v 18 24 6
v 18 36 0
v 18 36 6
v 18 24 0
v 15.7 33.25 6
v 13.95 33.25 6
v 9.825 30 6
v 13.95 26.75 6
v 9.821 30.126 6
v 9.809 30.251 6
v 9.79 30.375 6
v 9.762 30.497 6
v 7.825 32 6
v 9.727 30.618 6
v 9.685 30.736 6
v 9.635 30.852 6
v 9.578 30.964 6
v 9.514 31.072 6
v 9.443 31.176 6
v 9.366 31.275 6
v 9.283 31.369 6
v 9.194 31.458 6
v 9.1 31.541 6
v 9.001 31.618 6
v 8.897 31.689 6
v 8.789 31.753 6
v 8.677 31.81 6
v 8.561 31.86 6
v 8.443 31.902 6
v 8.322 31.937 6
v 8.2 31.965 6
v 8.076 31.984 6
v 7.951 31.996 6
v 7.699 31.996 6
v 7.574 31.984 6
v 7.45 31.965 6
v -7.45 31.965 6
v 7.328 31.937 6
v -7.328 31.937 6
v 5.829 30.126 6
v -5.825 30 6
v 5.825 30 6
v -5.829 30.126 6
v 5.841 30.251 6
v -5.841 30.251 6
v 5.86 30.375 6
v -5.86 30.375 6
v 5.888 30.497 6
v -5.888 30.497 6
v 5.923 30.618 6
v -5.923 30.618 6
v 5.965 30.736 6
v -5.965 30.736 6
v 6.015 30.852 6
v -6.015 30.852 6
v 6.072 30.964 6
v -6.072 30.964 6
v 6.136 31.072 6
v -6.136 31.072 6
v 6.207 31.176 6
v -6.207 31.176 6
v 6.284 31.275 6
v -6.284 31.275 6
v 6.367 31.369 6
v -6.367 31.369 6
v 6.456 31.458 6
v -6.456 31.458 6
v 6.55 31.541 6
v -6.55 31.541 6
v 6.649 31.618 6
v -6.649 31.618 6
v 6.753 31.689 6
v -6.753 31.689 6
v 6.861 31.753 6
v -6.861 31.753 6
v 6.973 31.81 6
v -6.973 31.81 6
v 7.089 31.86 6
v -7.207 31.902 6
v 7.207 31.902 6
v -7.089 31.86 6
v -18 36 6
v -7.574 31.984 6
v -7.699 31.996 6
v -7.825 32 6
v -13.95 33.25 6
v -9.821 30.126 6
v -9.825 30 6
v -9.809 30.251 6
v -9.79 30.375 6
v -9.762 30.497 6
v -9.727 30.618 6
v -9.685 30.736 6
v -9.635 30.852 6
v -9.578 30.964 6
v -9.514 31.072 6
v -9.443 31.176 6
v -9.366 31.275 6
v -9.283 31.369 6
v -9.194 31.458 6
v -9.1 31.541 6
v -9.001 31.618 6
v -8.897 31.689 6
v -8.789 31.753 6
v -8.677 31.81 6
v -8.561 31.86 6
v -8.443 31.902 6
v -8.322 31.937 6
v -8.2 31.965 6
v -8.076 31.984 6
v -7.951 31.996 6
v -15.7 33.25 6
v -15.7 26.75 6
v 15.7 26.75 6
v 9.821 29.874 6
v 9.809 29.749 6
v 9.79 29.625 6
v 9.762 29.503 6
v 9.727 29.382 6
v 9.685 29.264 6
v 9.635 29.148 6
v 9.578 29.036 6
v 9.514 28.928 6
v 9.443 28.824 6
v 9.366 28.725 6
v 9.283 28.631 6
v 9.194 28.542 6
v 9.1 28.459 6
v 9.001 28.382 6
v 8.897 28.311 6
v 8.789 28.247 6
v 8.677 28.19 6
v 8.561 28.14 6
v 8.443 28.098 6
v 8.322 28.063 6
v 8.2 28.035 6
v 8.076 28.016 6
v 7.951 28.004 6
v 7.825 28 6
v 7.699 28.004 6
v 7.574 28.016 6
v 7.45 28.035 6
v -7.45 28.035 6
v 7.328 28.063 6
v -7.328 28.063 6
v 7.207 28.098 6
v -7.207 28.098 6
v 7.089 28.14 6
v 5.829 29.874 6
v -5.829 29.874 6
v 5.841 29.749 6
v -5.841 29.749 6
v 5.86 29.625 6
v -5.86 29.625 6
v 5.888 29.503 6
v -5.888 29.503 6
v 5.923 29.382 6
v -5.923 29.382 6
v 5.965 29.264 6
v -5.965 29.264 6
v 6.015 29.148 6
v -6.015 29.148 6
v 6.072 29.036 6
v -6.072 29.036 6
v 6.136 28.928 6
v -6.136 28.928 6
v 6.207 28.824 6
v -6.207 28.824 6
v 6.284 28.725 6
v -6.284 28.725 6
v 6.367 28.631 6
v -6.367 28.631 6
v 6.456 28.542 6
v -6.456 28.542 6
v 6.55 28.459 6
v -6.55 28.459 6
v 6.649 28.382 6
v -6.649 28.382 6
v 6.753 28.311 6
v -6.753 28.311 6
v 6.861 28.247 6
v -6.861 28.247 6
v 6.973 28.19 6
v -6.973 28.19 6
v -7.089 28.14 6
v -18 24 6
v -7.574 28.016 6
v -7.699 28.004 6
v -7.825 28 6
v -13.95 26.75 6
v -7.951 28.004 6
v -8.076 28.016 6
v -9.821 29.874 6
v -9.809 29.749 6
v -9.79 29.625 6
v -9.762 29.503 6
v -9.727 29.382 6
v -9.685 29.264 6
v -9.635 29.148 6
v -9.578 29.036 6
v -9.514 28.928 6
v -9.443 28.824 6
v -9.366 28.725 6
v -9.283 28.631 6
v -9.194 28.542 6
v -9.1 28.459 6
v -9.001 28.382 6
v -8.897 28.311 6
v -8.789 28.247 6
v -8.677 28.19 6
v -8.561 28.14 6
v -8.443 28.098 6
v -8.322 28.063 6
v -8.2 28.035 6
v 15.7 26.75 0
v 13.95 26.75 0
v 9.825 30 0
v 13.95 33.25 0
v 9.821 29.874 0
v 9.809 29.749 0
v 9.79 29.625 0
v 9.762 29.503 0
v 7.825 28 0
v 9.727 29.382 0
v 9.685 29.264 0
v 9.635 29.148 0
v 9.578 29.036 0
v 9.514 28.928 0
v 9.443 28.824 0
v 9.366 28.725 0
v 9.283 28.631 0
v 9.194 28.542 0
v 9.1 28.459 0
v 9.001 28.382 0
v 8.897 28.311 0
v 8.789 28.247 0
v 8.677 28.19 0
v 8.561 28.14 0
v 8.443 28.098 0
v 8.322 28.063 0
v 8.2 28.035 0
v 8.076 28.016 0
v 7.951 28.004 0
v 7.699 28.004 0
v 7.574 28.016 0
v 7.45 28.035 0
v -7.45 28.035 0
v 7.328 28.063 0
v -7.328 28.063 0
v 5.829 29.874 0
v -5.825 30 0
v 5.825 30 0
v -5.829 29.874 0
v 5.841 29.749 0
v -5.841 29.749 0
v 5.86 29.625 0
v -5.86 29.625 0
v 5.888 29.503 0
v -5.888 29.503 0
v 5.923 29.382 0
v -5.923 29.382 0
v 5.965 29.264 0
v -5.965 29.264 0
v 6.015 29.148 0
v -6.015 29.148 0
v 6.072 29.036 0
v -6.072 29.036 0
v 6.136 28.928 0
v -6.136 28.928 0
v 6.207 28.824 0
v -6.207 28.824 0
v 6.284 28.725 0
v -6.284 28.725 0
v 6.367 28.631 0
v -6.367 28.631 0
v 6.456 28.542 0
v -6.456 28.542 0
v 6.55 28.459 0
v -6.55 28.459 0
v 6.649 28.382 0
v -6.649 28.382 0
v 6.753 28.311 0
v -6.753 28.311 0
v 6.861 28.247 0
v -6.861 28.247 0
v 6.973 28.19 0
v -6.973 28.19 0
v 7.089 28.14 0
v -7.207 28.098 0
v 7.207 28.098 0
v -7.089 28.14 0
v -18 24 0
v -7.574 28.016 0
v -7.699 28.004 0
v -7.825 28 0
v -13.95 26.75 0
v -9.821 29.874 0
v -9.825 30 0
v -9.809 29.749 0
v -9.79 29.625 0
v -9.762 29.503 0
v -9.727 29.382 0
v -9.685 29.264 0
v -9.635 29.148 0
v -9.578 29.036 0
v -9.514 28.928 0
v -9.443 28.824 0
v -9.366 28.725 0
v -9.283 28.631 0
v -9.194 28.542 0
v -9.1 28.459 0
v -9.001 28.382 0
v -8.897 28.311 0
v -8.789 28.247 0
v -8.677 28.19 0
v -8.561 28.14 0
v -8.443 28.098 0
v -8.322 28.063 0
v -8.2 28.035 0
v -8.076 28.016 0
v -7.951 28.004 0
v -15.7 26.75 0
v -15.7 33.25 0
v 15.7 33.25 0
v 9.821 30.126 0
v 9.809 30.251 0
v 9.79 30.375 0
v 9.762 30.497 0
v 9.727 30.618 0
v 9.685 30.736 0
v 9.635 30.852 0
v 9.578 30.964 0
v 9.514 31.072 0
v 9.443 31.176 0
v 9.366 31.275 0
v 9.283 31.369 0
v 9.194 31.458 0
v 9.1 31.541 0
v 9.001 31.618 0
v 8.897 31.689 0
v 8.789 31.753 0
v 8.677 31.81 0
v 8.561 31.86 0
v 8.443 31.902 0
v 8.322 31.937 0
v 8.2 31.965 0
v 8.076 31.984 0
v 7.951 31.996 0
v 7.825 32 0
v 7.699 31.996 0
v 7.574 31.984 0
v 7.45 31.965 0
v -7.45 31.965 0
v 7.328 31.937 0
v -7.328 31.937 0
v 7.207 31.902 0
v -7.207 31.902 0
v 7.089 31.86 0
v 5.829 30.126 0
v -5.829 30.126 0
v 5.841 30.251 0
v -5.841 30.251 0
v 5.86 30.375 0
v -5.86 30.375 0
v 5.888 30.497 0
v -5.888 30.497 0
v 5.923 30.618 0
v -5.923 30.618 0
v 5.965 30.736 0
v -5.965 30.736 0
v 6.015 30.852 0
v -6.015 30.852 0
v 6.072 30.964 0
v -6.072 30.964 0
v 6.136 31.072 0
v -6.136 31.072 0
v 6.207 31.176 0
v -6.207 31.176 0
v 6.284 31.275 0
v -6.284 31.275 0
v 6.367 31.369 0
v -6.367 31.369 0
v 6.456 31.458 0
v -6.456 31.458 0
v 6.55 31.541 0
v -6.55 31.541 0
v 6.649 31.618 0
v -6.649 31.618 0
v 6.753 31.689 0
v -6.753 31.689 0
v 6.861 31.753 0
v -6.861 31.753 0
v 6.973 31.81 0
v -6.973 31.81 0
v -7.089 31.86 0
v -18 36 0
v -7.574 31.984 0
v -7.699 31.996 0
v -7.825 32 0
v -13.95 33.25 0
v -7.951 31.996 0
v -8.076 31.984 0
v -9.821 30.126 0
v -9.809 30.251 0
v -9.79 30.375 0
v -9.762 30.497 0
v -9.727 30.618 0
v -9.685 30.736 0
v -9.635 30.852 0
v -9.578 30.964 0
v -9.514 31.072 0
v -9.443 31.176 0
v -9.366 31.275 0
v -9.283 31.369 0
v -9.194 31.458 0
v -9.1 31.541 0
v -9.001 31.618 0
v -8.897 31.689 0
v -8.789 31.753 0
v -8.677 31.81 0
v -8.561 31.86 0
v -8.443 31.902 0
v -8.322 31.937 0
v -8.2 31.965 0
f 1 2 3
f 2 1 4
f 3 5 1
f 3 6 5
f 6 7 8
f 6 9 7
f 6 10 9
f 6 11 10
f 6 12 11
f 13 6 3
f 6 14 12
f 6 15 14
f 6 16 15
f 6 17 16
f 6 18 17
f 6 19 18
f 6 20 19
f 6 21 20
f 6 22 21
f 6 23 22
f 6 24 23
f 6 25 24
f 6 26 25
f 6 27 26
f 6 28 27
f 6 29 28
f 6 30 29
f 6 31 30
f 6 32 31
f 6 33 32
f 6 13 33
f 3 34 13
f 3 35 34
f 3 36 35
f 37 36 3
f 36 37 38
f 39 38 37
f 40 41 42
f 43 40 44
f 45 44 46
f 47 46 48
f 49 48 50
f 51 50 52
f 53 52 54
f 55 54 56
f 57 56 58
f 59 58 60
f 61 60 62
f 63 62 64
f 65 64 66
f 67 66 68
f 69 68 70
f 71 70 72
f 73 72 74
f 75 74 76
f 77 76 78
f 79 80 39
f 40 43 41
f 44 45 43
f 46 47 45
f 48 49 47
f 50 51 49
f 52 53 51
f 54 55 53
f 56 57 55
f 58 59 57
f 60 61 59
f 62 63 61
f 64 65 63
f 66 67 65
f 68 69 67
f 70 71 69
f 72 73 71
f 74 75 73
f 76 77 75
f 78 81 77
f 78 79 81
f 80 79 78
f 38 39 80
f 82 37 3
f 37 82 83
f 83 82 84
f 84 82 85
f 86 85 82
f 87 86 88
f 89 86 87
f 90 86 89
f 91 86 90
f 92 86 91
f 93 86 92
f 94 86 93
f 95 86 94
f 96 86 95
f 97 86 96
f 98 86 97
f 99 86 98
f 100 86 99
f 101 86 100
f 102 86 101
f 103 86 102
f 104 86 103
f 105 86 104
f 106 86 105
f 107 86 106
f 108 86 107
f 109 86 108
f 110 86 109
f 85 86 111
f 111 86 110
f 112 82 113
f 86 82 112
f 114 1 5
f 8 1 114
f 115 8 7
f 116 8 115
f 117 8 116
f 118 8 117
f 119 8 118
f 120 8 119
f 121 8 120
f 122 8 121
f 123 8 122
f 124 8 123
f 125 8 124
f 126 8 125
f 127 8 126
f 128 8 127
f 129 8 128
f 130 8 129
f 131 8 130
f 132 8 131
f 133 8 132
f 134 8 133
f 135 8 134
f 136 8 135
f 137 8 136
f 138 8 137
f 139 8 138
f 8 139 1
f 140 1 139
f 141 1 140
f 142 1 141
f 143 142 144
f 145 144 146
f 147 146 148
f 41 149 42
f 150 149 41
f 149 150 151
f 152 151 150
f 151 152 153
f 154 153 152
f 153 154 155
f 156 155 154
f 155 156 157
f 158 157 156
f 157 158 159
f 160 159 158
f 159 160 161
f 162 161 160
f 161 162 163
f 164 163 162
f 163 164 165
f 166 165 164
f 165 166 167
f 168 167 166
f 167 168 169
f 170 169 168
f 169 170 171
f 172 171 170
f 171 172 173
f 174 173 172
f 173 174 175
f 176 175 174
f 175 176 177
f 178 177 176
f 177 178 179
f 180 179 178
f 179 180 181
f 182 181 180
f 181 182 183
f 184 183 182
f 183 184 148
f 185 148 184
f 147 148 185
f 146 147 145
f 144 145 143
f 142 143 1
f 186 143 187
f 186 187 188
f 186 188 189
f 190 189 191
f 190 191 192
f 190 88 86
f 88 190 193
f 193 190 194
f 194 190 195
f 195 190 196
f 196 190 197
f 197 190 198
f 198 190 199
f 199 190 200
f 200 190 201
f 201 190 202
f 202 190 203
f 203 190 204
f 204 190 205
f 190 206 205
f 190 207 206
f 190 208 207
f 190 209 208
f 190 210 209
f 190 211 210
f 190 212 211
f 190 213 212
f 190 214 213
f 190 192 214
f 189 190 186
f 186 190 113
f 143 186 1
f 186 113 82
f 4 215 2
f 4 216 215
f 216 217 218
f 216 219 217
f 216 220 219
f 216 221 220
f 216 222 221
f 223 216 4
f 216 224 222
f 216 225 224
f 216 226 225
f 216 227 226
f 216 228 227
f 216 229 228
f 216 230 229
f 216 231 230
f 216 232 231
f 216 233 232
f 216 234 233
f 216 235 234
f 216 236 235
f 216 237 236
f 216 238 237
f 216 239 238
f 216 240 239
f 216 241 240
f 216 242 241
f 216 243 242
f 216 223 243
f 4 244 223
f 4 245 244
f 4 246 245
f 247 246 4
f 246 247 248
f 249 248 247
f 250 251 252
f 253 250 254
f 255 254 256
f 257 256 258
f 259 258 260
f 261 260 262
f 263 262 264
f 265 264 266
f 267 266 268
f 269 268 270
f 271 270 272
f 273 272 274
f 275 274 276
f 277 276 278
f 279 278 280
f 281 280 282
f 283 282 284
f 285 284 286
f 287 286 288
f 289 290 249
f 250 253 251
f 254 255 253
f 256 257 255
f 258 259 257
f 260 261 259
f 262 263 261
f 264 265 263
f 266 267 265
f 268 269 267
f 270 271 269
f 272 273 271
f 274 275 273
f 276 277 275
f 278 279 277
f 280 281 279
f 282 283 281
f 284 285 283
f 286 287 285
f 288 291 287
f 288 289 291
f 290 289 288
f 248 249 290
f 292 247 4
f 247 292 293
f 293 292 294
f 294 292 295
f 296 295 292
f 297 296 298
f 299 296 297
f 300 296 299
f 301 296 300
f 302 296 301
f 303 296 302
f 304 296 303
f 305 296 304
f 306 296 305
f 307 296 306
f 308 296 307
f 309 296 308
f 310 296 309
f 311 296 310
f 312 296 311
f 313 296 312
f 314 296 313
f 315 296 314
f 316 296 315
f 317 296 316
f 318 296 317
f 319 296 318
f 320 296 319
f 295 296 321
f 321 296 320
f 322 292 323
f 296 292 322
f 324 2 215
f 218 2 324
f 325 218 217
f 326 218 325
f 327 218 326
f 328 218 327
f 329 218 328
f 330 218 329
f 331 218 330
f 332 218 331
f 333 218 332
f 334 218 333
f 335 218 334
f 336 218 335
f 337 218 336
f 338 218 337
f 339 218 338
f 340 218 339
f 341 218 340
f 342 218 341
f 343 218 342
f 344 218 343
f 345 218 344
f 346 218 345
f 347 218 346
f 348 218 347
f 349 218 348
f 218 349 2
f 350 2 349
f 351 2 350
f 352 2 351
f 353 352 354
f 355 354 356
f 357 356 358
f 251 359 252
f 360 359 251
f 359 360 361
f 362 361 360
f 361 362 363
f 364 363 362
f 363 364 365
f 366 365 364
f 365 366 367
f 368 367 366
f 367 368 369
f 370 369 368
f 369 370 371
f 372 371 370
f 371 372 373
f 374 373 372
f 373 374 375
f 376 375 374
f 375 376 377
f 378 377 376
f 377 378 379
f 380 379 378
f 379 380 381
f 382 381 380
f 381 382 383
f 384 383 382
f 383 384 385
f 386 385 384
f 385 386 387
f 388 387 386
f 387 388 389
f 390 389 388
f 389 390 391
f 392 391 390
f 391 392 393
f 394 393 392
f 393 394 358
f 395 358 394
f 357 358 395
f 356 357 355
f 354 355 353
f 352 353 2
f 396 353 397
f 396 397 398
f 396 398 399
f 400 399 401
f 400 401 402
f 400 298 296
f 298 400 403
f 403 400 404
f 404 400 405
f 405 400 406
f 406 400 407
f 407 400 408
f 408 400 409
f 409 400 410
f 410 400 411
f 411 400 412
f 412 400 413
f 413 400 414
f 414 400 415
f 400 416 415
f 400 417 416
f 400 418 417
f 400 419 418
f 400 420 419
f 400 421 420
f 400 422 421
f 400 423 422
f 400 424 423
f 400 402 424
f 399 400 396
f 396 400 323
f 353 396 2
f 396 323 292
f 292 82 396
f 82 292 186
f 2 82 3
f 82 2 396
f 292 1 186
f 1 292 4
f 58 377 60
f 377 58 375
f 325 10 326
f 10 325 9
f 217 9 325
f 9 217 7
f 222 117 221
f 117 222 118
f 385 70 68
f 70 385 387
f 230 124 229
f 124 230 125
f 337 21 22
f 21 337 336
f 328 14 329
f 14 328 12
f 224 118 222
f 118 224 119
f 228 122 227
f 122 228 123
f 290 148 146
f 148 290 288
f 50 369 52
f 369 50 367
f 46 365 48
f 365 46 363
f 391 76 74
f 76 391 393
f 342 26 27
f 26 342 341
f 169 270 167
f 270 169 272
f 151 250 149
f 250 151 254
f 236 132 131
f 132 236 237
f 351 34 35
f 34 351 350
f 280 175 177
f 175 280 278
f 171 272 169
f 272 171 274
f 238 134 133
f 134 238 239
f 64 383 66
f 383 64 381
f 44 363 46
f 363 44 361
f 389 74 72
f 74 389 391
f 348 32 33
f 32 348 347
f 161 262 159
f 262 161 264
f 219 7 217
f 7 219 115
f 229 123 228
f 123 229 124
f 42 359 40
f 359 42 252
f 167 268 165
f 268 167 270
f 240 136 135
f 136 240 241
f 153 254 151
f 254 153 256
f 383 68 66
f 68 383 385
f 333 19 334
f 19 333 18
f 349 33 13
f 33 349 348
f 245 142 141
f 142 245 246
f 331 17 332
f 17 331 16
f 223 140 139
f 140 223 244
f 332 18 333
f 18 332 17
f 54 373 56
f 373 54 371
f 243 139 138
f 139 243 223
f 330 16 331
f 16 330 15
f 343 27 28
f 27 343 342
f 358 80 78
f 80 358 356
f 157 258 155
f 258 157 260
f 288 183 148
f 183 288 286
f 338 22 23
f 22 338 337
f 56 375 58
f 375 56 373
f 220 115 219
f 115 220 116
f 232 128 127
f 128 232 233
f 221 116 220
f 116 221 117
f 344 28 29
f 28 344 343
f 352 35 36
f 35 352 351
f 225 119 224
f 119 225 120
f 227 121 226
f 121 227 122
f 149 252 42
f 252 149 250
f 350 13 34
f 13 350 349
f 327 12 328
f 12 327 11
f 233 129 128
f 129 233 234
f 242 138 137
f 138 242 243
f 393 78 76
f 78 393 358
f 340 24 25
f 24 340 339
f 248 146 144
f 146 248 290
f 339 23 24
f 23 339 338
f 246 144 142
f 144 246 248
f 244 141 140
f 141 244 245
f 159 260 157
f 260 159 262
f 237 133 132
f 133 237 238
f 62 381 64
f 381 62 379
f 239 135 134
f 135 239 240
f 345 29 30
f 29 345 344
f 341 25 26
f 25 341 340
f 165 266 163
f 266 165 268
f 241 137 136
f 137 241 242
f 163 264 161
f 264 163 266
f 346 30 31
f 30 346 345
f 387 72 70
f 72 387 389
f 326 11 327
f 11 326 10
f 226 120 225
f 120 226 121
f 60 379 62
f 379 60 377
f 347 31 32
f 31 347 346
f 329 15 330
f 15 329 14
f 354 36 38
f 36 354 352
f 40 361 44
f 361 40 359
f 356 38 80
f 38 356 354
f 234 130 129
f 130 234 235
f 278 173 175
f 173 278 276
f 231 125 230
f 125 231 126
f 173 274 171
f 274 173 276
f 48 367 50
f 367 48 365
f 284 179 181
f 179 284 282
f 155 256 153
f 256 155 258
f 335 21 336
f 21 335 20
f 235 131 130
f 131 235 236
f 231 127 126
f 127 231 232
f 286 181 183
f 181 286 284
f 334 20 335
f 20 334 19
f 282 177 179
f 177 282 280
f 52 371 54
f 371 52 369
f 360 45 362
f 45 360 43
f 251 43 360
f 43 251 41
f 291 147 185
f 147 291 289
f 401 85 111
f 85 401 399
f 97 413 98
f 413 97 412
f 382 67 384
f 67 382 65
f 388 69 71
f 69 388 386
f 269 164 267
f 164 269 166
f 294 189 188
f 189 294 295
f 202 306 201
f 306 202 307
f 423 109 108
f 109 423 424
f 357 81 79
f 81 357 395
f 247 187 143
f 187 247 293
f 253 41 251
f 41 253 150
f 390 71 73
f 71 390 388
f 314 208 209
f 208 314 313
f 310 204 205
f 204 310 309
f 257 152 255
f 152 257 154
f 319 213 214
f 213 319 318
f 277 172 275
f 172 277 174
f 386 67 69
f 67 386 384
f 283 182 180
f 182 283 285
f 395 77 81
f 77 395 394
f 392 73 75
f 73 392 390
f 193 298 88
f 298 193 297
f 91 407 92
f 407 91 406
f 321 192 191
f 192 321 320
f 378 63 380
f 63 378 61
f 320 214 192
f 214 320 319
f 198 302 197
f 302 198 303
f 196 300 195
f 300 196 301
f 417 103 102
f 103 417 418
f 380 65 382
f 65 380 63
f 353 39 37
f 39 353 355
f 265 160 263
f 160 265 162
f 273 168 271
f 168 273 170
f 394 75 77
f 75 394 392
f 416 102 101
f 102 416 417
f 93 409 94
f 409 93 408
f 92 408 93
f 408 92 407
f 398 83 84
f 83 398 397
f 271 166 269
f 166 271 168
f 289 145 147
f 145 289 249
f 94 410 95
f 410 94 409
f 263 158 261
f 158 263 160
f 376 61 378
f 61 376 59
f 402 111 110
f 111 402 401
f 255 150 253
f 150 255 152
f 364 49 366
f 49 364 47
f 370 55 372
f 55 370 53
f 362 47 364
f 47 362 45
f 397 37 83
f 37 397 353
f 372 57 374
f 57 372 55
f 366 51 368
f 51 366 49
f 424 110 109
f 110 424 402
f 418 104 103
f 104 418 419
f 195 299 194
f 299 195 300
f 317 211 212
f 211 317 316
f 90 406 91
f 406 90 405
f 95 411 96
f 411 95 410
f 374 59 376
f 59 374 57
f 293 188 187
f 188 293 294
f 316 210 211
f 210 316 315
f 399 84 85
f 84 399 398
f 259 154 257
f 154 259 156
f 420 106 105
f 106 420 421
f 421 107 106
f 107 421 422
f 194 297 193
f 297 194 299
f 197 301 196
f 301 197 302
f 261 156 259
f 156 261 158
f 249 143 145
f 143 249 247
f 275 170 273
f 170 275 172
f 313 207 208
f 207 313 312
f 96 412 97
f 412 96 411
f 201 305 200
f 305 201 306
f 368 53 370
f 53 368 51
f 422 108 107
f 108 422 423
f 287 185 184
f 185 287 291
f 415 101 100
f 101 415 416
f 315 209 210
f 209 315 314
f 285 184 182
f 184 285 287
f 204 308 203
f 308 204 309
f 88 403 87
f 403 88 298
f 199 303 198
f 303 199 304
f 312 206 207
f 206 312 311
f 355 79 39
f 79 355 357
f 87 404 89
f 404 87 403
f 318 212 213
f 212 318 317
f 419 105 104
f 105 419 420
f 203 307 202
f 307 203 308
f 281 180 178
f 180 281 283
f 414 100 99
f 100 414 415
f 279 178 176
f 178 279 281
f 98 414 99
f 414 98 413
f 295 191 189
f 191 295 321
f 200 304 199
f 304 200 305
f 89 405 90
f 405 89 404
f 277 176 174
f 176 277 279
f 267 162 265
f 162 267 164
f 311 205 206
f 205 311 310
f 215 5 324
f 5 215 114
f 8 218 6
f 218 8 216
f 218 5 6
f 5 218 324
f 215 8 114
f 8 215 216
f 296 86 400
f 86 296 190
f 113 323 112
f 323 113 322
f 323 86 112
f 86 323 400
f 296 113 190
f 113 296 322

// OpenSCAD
// file: ucon_config.scad
tubeOD = 0.92*25.4+0.25;	//0.92", thin-wall 3/4" conduit +0.4 clearance
tubeID = 20.828;	// 0.82", thin-wall 3/4" conduit
wallthick = 7;		// wall thickness for the tube
clearOD = 0.5;		// tube clearance
screwOD = 4.7;		// clearance for M4 or SAE size 8 screw
screwthick = 3;		// wall thickness for the screw
totalheight = 25;
clearance = 0.5;
tolerance = 0.1;
oringthick = 2.5;
oringOD = 28.702;	// oring size 119 (use 118 for build)
overlap = 0.05;
clearlen = 5;

ctcdist = 50;
// main file
include <ucon_config.scad>
use <ucon_functions.scad>
use <MCAD/motors.scad>
use <MCAD/nuts_and_bolts.scad>
$fn=100;


rod_spacing = 20;
bearing_spacing = 12;
bushingOD = 16+0.1;
bushingOD2 = 18;
bushingL = 11.5;
hotendsep = 11.65;
belt_h = 1.75;
belt_w = 6.5;

//translate([15,0,0]) ycarriage();
//translate([-15,0,0]) scale([-1,1,1]) ycarriage();
translate([0,30,3]) belt_clip();

module belt_clip(){
difference(){cube([36,12,6],center=true);
//cube([24,12,8],center=true);
translate([2+hotendsep/2,0,0]) rotate([0,0,0]) cylinder(r=2,h=30,center=true);
translate([-2-hotendsep/2,0,0]) rotate([0,0,0]) cylinder(r=2,h=30,center=true);
translate([2+hotendsep/2+7,0,0]) rotate([0,0,0]) cube([belt_h,belt_w,30],center=true);
translate([-(2+hotendsep/2+7),0,0]) rotate([0,0,0]) cube([belt_h,belt_w,30],center=true);}
}

module ycarriage(){

difference(){
cross_section();
translate([0,0,2+hotendsep/2]) rotate([0,90,0]) cylinder(r=2,h=30,center=true);
translate([9.5,0,2+hotendsep/2]) rotate([0,-90,0]) nutSlot(10,0.1);
rotate([0,0,90]) rodsnbushings();
}
}

module cross_section(){
difference(){
union(){
linear_extrude(height=12)
minkowski(){
union(){
translate([0,rod_spacing/2,0]) circle(r=bushingOD/2,center=true);
translate([0,-rod_spacing/2,0]) circle(r=bushingOD/2,center=true);
translate([bushingOD/4+1.0,0,0]) square([bushingOD/2+1.0,rod_spacing+bushingOD],center=true);
}
circle(r=3);}
translate([0,0,6]) cube([14,10,12],center=true);
translate([-bushingOD/2,rod_spacing/2+bushingOD/2,0]) cylinder(r=9/2,h=12,center=false);
translate([-bushingOD/2,-rod_spacing/2-bushingOD/2,0]) cylinder(r=9/2,h=12,center=false);
translate([bushingOD/2,rod_spacing/2+bushingOD/2,0]) cylinder(r=9/2,h=12,center=false);
translate([bushingOD/2,-rod_spacing/2-bushingOD/2,0]) cylinder(r=9/2,h=12,center=false);}
translate([-bushingOD/2,rod_spacing/2+bushingOD/2,-0.1]) cylinder(r=2,h=15,center=false);
translate([-bushingOD/2,-rod_spacing/2-bushingOD/2,-0.1]) cylinder(r=2,h=15,center=false);
translate([bushingOD/2,rod_spacing/2+bushingOD/2,-0.1]) cylinder(r=2,h=15,center=false);
translate([bushingOD/2,-rod_spacing/2-bushingOD/2,-0.1]) cylinder(r=2,h=15,center=false);}


//translate([-13.5,0,0]) cube([1.5,6,20],center=true);
}

module rodsnbushings(){
translate([0,0,bushingL/2])
union(){
translate([rod_spacing/2,0,0]) cylinder(r=4.1,h=100,center=true);
translate([-rod_spacing/2,0,0]) cylinder(r=4.1,h=100,center=true);
translate([rod_spacing/2,0,0]) cylinder(r=bushingOD/2,h=bushingL+0.05,center=true);
translate([-rod_spacing/2,0,0]) cylinder(r=bushingOD/2,h=bushingL+0.05,center=true);
translate([rod_spacing/2,0,bushingL]) cylinder(r=bushingOD2/2,h=bushingL+0.05,center=true);
translate([-rod_spacing/2,0,bushingL]) cylinder(r=bushingOD2/2,h=bushingL+0.05,center=true);
}}
